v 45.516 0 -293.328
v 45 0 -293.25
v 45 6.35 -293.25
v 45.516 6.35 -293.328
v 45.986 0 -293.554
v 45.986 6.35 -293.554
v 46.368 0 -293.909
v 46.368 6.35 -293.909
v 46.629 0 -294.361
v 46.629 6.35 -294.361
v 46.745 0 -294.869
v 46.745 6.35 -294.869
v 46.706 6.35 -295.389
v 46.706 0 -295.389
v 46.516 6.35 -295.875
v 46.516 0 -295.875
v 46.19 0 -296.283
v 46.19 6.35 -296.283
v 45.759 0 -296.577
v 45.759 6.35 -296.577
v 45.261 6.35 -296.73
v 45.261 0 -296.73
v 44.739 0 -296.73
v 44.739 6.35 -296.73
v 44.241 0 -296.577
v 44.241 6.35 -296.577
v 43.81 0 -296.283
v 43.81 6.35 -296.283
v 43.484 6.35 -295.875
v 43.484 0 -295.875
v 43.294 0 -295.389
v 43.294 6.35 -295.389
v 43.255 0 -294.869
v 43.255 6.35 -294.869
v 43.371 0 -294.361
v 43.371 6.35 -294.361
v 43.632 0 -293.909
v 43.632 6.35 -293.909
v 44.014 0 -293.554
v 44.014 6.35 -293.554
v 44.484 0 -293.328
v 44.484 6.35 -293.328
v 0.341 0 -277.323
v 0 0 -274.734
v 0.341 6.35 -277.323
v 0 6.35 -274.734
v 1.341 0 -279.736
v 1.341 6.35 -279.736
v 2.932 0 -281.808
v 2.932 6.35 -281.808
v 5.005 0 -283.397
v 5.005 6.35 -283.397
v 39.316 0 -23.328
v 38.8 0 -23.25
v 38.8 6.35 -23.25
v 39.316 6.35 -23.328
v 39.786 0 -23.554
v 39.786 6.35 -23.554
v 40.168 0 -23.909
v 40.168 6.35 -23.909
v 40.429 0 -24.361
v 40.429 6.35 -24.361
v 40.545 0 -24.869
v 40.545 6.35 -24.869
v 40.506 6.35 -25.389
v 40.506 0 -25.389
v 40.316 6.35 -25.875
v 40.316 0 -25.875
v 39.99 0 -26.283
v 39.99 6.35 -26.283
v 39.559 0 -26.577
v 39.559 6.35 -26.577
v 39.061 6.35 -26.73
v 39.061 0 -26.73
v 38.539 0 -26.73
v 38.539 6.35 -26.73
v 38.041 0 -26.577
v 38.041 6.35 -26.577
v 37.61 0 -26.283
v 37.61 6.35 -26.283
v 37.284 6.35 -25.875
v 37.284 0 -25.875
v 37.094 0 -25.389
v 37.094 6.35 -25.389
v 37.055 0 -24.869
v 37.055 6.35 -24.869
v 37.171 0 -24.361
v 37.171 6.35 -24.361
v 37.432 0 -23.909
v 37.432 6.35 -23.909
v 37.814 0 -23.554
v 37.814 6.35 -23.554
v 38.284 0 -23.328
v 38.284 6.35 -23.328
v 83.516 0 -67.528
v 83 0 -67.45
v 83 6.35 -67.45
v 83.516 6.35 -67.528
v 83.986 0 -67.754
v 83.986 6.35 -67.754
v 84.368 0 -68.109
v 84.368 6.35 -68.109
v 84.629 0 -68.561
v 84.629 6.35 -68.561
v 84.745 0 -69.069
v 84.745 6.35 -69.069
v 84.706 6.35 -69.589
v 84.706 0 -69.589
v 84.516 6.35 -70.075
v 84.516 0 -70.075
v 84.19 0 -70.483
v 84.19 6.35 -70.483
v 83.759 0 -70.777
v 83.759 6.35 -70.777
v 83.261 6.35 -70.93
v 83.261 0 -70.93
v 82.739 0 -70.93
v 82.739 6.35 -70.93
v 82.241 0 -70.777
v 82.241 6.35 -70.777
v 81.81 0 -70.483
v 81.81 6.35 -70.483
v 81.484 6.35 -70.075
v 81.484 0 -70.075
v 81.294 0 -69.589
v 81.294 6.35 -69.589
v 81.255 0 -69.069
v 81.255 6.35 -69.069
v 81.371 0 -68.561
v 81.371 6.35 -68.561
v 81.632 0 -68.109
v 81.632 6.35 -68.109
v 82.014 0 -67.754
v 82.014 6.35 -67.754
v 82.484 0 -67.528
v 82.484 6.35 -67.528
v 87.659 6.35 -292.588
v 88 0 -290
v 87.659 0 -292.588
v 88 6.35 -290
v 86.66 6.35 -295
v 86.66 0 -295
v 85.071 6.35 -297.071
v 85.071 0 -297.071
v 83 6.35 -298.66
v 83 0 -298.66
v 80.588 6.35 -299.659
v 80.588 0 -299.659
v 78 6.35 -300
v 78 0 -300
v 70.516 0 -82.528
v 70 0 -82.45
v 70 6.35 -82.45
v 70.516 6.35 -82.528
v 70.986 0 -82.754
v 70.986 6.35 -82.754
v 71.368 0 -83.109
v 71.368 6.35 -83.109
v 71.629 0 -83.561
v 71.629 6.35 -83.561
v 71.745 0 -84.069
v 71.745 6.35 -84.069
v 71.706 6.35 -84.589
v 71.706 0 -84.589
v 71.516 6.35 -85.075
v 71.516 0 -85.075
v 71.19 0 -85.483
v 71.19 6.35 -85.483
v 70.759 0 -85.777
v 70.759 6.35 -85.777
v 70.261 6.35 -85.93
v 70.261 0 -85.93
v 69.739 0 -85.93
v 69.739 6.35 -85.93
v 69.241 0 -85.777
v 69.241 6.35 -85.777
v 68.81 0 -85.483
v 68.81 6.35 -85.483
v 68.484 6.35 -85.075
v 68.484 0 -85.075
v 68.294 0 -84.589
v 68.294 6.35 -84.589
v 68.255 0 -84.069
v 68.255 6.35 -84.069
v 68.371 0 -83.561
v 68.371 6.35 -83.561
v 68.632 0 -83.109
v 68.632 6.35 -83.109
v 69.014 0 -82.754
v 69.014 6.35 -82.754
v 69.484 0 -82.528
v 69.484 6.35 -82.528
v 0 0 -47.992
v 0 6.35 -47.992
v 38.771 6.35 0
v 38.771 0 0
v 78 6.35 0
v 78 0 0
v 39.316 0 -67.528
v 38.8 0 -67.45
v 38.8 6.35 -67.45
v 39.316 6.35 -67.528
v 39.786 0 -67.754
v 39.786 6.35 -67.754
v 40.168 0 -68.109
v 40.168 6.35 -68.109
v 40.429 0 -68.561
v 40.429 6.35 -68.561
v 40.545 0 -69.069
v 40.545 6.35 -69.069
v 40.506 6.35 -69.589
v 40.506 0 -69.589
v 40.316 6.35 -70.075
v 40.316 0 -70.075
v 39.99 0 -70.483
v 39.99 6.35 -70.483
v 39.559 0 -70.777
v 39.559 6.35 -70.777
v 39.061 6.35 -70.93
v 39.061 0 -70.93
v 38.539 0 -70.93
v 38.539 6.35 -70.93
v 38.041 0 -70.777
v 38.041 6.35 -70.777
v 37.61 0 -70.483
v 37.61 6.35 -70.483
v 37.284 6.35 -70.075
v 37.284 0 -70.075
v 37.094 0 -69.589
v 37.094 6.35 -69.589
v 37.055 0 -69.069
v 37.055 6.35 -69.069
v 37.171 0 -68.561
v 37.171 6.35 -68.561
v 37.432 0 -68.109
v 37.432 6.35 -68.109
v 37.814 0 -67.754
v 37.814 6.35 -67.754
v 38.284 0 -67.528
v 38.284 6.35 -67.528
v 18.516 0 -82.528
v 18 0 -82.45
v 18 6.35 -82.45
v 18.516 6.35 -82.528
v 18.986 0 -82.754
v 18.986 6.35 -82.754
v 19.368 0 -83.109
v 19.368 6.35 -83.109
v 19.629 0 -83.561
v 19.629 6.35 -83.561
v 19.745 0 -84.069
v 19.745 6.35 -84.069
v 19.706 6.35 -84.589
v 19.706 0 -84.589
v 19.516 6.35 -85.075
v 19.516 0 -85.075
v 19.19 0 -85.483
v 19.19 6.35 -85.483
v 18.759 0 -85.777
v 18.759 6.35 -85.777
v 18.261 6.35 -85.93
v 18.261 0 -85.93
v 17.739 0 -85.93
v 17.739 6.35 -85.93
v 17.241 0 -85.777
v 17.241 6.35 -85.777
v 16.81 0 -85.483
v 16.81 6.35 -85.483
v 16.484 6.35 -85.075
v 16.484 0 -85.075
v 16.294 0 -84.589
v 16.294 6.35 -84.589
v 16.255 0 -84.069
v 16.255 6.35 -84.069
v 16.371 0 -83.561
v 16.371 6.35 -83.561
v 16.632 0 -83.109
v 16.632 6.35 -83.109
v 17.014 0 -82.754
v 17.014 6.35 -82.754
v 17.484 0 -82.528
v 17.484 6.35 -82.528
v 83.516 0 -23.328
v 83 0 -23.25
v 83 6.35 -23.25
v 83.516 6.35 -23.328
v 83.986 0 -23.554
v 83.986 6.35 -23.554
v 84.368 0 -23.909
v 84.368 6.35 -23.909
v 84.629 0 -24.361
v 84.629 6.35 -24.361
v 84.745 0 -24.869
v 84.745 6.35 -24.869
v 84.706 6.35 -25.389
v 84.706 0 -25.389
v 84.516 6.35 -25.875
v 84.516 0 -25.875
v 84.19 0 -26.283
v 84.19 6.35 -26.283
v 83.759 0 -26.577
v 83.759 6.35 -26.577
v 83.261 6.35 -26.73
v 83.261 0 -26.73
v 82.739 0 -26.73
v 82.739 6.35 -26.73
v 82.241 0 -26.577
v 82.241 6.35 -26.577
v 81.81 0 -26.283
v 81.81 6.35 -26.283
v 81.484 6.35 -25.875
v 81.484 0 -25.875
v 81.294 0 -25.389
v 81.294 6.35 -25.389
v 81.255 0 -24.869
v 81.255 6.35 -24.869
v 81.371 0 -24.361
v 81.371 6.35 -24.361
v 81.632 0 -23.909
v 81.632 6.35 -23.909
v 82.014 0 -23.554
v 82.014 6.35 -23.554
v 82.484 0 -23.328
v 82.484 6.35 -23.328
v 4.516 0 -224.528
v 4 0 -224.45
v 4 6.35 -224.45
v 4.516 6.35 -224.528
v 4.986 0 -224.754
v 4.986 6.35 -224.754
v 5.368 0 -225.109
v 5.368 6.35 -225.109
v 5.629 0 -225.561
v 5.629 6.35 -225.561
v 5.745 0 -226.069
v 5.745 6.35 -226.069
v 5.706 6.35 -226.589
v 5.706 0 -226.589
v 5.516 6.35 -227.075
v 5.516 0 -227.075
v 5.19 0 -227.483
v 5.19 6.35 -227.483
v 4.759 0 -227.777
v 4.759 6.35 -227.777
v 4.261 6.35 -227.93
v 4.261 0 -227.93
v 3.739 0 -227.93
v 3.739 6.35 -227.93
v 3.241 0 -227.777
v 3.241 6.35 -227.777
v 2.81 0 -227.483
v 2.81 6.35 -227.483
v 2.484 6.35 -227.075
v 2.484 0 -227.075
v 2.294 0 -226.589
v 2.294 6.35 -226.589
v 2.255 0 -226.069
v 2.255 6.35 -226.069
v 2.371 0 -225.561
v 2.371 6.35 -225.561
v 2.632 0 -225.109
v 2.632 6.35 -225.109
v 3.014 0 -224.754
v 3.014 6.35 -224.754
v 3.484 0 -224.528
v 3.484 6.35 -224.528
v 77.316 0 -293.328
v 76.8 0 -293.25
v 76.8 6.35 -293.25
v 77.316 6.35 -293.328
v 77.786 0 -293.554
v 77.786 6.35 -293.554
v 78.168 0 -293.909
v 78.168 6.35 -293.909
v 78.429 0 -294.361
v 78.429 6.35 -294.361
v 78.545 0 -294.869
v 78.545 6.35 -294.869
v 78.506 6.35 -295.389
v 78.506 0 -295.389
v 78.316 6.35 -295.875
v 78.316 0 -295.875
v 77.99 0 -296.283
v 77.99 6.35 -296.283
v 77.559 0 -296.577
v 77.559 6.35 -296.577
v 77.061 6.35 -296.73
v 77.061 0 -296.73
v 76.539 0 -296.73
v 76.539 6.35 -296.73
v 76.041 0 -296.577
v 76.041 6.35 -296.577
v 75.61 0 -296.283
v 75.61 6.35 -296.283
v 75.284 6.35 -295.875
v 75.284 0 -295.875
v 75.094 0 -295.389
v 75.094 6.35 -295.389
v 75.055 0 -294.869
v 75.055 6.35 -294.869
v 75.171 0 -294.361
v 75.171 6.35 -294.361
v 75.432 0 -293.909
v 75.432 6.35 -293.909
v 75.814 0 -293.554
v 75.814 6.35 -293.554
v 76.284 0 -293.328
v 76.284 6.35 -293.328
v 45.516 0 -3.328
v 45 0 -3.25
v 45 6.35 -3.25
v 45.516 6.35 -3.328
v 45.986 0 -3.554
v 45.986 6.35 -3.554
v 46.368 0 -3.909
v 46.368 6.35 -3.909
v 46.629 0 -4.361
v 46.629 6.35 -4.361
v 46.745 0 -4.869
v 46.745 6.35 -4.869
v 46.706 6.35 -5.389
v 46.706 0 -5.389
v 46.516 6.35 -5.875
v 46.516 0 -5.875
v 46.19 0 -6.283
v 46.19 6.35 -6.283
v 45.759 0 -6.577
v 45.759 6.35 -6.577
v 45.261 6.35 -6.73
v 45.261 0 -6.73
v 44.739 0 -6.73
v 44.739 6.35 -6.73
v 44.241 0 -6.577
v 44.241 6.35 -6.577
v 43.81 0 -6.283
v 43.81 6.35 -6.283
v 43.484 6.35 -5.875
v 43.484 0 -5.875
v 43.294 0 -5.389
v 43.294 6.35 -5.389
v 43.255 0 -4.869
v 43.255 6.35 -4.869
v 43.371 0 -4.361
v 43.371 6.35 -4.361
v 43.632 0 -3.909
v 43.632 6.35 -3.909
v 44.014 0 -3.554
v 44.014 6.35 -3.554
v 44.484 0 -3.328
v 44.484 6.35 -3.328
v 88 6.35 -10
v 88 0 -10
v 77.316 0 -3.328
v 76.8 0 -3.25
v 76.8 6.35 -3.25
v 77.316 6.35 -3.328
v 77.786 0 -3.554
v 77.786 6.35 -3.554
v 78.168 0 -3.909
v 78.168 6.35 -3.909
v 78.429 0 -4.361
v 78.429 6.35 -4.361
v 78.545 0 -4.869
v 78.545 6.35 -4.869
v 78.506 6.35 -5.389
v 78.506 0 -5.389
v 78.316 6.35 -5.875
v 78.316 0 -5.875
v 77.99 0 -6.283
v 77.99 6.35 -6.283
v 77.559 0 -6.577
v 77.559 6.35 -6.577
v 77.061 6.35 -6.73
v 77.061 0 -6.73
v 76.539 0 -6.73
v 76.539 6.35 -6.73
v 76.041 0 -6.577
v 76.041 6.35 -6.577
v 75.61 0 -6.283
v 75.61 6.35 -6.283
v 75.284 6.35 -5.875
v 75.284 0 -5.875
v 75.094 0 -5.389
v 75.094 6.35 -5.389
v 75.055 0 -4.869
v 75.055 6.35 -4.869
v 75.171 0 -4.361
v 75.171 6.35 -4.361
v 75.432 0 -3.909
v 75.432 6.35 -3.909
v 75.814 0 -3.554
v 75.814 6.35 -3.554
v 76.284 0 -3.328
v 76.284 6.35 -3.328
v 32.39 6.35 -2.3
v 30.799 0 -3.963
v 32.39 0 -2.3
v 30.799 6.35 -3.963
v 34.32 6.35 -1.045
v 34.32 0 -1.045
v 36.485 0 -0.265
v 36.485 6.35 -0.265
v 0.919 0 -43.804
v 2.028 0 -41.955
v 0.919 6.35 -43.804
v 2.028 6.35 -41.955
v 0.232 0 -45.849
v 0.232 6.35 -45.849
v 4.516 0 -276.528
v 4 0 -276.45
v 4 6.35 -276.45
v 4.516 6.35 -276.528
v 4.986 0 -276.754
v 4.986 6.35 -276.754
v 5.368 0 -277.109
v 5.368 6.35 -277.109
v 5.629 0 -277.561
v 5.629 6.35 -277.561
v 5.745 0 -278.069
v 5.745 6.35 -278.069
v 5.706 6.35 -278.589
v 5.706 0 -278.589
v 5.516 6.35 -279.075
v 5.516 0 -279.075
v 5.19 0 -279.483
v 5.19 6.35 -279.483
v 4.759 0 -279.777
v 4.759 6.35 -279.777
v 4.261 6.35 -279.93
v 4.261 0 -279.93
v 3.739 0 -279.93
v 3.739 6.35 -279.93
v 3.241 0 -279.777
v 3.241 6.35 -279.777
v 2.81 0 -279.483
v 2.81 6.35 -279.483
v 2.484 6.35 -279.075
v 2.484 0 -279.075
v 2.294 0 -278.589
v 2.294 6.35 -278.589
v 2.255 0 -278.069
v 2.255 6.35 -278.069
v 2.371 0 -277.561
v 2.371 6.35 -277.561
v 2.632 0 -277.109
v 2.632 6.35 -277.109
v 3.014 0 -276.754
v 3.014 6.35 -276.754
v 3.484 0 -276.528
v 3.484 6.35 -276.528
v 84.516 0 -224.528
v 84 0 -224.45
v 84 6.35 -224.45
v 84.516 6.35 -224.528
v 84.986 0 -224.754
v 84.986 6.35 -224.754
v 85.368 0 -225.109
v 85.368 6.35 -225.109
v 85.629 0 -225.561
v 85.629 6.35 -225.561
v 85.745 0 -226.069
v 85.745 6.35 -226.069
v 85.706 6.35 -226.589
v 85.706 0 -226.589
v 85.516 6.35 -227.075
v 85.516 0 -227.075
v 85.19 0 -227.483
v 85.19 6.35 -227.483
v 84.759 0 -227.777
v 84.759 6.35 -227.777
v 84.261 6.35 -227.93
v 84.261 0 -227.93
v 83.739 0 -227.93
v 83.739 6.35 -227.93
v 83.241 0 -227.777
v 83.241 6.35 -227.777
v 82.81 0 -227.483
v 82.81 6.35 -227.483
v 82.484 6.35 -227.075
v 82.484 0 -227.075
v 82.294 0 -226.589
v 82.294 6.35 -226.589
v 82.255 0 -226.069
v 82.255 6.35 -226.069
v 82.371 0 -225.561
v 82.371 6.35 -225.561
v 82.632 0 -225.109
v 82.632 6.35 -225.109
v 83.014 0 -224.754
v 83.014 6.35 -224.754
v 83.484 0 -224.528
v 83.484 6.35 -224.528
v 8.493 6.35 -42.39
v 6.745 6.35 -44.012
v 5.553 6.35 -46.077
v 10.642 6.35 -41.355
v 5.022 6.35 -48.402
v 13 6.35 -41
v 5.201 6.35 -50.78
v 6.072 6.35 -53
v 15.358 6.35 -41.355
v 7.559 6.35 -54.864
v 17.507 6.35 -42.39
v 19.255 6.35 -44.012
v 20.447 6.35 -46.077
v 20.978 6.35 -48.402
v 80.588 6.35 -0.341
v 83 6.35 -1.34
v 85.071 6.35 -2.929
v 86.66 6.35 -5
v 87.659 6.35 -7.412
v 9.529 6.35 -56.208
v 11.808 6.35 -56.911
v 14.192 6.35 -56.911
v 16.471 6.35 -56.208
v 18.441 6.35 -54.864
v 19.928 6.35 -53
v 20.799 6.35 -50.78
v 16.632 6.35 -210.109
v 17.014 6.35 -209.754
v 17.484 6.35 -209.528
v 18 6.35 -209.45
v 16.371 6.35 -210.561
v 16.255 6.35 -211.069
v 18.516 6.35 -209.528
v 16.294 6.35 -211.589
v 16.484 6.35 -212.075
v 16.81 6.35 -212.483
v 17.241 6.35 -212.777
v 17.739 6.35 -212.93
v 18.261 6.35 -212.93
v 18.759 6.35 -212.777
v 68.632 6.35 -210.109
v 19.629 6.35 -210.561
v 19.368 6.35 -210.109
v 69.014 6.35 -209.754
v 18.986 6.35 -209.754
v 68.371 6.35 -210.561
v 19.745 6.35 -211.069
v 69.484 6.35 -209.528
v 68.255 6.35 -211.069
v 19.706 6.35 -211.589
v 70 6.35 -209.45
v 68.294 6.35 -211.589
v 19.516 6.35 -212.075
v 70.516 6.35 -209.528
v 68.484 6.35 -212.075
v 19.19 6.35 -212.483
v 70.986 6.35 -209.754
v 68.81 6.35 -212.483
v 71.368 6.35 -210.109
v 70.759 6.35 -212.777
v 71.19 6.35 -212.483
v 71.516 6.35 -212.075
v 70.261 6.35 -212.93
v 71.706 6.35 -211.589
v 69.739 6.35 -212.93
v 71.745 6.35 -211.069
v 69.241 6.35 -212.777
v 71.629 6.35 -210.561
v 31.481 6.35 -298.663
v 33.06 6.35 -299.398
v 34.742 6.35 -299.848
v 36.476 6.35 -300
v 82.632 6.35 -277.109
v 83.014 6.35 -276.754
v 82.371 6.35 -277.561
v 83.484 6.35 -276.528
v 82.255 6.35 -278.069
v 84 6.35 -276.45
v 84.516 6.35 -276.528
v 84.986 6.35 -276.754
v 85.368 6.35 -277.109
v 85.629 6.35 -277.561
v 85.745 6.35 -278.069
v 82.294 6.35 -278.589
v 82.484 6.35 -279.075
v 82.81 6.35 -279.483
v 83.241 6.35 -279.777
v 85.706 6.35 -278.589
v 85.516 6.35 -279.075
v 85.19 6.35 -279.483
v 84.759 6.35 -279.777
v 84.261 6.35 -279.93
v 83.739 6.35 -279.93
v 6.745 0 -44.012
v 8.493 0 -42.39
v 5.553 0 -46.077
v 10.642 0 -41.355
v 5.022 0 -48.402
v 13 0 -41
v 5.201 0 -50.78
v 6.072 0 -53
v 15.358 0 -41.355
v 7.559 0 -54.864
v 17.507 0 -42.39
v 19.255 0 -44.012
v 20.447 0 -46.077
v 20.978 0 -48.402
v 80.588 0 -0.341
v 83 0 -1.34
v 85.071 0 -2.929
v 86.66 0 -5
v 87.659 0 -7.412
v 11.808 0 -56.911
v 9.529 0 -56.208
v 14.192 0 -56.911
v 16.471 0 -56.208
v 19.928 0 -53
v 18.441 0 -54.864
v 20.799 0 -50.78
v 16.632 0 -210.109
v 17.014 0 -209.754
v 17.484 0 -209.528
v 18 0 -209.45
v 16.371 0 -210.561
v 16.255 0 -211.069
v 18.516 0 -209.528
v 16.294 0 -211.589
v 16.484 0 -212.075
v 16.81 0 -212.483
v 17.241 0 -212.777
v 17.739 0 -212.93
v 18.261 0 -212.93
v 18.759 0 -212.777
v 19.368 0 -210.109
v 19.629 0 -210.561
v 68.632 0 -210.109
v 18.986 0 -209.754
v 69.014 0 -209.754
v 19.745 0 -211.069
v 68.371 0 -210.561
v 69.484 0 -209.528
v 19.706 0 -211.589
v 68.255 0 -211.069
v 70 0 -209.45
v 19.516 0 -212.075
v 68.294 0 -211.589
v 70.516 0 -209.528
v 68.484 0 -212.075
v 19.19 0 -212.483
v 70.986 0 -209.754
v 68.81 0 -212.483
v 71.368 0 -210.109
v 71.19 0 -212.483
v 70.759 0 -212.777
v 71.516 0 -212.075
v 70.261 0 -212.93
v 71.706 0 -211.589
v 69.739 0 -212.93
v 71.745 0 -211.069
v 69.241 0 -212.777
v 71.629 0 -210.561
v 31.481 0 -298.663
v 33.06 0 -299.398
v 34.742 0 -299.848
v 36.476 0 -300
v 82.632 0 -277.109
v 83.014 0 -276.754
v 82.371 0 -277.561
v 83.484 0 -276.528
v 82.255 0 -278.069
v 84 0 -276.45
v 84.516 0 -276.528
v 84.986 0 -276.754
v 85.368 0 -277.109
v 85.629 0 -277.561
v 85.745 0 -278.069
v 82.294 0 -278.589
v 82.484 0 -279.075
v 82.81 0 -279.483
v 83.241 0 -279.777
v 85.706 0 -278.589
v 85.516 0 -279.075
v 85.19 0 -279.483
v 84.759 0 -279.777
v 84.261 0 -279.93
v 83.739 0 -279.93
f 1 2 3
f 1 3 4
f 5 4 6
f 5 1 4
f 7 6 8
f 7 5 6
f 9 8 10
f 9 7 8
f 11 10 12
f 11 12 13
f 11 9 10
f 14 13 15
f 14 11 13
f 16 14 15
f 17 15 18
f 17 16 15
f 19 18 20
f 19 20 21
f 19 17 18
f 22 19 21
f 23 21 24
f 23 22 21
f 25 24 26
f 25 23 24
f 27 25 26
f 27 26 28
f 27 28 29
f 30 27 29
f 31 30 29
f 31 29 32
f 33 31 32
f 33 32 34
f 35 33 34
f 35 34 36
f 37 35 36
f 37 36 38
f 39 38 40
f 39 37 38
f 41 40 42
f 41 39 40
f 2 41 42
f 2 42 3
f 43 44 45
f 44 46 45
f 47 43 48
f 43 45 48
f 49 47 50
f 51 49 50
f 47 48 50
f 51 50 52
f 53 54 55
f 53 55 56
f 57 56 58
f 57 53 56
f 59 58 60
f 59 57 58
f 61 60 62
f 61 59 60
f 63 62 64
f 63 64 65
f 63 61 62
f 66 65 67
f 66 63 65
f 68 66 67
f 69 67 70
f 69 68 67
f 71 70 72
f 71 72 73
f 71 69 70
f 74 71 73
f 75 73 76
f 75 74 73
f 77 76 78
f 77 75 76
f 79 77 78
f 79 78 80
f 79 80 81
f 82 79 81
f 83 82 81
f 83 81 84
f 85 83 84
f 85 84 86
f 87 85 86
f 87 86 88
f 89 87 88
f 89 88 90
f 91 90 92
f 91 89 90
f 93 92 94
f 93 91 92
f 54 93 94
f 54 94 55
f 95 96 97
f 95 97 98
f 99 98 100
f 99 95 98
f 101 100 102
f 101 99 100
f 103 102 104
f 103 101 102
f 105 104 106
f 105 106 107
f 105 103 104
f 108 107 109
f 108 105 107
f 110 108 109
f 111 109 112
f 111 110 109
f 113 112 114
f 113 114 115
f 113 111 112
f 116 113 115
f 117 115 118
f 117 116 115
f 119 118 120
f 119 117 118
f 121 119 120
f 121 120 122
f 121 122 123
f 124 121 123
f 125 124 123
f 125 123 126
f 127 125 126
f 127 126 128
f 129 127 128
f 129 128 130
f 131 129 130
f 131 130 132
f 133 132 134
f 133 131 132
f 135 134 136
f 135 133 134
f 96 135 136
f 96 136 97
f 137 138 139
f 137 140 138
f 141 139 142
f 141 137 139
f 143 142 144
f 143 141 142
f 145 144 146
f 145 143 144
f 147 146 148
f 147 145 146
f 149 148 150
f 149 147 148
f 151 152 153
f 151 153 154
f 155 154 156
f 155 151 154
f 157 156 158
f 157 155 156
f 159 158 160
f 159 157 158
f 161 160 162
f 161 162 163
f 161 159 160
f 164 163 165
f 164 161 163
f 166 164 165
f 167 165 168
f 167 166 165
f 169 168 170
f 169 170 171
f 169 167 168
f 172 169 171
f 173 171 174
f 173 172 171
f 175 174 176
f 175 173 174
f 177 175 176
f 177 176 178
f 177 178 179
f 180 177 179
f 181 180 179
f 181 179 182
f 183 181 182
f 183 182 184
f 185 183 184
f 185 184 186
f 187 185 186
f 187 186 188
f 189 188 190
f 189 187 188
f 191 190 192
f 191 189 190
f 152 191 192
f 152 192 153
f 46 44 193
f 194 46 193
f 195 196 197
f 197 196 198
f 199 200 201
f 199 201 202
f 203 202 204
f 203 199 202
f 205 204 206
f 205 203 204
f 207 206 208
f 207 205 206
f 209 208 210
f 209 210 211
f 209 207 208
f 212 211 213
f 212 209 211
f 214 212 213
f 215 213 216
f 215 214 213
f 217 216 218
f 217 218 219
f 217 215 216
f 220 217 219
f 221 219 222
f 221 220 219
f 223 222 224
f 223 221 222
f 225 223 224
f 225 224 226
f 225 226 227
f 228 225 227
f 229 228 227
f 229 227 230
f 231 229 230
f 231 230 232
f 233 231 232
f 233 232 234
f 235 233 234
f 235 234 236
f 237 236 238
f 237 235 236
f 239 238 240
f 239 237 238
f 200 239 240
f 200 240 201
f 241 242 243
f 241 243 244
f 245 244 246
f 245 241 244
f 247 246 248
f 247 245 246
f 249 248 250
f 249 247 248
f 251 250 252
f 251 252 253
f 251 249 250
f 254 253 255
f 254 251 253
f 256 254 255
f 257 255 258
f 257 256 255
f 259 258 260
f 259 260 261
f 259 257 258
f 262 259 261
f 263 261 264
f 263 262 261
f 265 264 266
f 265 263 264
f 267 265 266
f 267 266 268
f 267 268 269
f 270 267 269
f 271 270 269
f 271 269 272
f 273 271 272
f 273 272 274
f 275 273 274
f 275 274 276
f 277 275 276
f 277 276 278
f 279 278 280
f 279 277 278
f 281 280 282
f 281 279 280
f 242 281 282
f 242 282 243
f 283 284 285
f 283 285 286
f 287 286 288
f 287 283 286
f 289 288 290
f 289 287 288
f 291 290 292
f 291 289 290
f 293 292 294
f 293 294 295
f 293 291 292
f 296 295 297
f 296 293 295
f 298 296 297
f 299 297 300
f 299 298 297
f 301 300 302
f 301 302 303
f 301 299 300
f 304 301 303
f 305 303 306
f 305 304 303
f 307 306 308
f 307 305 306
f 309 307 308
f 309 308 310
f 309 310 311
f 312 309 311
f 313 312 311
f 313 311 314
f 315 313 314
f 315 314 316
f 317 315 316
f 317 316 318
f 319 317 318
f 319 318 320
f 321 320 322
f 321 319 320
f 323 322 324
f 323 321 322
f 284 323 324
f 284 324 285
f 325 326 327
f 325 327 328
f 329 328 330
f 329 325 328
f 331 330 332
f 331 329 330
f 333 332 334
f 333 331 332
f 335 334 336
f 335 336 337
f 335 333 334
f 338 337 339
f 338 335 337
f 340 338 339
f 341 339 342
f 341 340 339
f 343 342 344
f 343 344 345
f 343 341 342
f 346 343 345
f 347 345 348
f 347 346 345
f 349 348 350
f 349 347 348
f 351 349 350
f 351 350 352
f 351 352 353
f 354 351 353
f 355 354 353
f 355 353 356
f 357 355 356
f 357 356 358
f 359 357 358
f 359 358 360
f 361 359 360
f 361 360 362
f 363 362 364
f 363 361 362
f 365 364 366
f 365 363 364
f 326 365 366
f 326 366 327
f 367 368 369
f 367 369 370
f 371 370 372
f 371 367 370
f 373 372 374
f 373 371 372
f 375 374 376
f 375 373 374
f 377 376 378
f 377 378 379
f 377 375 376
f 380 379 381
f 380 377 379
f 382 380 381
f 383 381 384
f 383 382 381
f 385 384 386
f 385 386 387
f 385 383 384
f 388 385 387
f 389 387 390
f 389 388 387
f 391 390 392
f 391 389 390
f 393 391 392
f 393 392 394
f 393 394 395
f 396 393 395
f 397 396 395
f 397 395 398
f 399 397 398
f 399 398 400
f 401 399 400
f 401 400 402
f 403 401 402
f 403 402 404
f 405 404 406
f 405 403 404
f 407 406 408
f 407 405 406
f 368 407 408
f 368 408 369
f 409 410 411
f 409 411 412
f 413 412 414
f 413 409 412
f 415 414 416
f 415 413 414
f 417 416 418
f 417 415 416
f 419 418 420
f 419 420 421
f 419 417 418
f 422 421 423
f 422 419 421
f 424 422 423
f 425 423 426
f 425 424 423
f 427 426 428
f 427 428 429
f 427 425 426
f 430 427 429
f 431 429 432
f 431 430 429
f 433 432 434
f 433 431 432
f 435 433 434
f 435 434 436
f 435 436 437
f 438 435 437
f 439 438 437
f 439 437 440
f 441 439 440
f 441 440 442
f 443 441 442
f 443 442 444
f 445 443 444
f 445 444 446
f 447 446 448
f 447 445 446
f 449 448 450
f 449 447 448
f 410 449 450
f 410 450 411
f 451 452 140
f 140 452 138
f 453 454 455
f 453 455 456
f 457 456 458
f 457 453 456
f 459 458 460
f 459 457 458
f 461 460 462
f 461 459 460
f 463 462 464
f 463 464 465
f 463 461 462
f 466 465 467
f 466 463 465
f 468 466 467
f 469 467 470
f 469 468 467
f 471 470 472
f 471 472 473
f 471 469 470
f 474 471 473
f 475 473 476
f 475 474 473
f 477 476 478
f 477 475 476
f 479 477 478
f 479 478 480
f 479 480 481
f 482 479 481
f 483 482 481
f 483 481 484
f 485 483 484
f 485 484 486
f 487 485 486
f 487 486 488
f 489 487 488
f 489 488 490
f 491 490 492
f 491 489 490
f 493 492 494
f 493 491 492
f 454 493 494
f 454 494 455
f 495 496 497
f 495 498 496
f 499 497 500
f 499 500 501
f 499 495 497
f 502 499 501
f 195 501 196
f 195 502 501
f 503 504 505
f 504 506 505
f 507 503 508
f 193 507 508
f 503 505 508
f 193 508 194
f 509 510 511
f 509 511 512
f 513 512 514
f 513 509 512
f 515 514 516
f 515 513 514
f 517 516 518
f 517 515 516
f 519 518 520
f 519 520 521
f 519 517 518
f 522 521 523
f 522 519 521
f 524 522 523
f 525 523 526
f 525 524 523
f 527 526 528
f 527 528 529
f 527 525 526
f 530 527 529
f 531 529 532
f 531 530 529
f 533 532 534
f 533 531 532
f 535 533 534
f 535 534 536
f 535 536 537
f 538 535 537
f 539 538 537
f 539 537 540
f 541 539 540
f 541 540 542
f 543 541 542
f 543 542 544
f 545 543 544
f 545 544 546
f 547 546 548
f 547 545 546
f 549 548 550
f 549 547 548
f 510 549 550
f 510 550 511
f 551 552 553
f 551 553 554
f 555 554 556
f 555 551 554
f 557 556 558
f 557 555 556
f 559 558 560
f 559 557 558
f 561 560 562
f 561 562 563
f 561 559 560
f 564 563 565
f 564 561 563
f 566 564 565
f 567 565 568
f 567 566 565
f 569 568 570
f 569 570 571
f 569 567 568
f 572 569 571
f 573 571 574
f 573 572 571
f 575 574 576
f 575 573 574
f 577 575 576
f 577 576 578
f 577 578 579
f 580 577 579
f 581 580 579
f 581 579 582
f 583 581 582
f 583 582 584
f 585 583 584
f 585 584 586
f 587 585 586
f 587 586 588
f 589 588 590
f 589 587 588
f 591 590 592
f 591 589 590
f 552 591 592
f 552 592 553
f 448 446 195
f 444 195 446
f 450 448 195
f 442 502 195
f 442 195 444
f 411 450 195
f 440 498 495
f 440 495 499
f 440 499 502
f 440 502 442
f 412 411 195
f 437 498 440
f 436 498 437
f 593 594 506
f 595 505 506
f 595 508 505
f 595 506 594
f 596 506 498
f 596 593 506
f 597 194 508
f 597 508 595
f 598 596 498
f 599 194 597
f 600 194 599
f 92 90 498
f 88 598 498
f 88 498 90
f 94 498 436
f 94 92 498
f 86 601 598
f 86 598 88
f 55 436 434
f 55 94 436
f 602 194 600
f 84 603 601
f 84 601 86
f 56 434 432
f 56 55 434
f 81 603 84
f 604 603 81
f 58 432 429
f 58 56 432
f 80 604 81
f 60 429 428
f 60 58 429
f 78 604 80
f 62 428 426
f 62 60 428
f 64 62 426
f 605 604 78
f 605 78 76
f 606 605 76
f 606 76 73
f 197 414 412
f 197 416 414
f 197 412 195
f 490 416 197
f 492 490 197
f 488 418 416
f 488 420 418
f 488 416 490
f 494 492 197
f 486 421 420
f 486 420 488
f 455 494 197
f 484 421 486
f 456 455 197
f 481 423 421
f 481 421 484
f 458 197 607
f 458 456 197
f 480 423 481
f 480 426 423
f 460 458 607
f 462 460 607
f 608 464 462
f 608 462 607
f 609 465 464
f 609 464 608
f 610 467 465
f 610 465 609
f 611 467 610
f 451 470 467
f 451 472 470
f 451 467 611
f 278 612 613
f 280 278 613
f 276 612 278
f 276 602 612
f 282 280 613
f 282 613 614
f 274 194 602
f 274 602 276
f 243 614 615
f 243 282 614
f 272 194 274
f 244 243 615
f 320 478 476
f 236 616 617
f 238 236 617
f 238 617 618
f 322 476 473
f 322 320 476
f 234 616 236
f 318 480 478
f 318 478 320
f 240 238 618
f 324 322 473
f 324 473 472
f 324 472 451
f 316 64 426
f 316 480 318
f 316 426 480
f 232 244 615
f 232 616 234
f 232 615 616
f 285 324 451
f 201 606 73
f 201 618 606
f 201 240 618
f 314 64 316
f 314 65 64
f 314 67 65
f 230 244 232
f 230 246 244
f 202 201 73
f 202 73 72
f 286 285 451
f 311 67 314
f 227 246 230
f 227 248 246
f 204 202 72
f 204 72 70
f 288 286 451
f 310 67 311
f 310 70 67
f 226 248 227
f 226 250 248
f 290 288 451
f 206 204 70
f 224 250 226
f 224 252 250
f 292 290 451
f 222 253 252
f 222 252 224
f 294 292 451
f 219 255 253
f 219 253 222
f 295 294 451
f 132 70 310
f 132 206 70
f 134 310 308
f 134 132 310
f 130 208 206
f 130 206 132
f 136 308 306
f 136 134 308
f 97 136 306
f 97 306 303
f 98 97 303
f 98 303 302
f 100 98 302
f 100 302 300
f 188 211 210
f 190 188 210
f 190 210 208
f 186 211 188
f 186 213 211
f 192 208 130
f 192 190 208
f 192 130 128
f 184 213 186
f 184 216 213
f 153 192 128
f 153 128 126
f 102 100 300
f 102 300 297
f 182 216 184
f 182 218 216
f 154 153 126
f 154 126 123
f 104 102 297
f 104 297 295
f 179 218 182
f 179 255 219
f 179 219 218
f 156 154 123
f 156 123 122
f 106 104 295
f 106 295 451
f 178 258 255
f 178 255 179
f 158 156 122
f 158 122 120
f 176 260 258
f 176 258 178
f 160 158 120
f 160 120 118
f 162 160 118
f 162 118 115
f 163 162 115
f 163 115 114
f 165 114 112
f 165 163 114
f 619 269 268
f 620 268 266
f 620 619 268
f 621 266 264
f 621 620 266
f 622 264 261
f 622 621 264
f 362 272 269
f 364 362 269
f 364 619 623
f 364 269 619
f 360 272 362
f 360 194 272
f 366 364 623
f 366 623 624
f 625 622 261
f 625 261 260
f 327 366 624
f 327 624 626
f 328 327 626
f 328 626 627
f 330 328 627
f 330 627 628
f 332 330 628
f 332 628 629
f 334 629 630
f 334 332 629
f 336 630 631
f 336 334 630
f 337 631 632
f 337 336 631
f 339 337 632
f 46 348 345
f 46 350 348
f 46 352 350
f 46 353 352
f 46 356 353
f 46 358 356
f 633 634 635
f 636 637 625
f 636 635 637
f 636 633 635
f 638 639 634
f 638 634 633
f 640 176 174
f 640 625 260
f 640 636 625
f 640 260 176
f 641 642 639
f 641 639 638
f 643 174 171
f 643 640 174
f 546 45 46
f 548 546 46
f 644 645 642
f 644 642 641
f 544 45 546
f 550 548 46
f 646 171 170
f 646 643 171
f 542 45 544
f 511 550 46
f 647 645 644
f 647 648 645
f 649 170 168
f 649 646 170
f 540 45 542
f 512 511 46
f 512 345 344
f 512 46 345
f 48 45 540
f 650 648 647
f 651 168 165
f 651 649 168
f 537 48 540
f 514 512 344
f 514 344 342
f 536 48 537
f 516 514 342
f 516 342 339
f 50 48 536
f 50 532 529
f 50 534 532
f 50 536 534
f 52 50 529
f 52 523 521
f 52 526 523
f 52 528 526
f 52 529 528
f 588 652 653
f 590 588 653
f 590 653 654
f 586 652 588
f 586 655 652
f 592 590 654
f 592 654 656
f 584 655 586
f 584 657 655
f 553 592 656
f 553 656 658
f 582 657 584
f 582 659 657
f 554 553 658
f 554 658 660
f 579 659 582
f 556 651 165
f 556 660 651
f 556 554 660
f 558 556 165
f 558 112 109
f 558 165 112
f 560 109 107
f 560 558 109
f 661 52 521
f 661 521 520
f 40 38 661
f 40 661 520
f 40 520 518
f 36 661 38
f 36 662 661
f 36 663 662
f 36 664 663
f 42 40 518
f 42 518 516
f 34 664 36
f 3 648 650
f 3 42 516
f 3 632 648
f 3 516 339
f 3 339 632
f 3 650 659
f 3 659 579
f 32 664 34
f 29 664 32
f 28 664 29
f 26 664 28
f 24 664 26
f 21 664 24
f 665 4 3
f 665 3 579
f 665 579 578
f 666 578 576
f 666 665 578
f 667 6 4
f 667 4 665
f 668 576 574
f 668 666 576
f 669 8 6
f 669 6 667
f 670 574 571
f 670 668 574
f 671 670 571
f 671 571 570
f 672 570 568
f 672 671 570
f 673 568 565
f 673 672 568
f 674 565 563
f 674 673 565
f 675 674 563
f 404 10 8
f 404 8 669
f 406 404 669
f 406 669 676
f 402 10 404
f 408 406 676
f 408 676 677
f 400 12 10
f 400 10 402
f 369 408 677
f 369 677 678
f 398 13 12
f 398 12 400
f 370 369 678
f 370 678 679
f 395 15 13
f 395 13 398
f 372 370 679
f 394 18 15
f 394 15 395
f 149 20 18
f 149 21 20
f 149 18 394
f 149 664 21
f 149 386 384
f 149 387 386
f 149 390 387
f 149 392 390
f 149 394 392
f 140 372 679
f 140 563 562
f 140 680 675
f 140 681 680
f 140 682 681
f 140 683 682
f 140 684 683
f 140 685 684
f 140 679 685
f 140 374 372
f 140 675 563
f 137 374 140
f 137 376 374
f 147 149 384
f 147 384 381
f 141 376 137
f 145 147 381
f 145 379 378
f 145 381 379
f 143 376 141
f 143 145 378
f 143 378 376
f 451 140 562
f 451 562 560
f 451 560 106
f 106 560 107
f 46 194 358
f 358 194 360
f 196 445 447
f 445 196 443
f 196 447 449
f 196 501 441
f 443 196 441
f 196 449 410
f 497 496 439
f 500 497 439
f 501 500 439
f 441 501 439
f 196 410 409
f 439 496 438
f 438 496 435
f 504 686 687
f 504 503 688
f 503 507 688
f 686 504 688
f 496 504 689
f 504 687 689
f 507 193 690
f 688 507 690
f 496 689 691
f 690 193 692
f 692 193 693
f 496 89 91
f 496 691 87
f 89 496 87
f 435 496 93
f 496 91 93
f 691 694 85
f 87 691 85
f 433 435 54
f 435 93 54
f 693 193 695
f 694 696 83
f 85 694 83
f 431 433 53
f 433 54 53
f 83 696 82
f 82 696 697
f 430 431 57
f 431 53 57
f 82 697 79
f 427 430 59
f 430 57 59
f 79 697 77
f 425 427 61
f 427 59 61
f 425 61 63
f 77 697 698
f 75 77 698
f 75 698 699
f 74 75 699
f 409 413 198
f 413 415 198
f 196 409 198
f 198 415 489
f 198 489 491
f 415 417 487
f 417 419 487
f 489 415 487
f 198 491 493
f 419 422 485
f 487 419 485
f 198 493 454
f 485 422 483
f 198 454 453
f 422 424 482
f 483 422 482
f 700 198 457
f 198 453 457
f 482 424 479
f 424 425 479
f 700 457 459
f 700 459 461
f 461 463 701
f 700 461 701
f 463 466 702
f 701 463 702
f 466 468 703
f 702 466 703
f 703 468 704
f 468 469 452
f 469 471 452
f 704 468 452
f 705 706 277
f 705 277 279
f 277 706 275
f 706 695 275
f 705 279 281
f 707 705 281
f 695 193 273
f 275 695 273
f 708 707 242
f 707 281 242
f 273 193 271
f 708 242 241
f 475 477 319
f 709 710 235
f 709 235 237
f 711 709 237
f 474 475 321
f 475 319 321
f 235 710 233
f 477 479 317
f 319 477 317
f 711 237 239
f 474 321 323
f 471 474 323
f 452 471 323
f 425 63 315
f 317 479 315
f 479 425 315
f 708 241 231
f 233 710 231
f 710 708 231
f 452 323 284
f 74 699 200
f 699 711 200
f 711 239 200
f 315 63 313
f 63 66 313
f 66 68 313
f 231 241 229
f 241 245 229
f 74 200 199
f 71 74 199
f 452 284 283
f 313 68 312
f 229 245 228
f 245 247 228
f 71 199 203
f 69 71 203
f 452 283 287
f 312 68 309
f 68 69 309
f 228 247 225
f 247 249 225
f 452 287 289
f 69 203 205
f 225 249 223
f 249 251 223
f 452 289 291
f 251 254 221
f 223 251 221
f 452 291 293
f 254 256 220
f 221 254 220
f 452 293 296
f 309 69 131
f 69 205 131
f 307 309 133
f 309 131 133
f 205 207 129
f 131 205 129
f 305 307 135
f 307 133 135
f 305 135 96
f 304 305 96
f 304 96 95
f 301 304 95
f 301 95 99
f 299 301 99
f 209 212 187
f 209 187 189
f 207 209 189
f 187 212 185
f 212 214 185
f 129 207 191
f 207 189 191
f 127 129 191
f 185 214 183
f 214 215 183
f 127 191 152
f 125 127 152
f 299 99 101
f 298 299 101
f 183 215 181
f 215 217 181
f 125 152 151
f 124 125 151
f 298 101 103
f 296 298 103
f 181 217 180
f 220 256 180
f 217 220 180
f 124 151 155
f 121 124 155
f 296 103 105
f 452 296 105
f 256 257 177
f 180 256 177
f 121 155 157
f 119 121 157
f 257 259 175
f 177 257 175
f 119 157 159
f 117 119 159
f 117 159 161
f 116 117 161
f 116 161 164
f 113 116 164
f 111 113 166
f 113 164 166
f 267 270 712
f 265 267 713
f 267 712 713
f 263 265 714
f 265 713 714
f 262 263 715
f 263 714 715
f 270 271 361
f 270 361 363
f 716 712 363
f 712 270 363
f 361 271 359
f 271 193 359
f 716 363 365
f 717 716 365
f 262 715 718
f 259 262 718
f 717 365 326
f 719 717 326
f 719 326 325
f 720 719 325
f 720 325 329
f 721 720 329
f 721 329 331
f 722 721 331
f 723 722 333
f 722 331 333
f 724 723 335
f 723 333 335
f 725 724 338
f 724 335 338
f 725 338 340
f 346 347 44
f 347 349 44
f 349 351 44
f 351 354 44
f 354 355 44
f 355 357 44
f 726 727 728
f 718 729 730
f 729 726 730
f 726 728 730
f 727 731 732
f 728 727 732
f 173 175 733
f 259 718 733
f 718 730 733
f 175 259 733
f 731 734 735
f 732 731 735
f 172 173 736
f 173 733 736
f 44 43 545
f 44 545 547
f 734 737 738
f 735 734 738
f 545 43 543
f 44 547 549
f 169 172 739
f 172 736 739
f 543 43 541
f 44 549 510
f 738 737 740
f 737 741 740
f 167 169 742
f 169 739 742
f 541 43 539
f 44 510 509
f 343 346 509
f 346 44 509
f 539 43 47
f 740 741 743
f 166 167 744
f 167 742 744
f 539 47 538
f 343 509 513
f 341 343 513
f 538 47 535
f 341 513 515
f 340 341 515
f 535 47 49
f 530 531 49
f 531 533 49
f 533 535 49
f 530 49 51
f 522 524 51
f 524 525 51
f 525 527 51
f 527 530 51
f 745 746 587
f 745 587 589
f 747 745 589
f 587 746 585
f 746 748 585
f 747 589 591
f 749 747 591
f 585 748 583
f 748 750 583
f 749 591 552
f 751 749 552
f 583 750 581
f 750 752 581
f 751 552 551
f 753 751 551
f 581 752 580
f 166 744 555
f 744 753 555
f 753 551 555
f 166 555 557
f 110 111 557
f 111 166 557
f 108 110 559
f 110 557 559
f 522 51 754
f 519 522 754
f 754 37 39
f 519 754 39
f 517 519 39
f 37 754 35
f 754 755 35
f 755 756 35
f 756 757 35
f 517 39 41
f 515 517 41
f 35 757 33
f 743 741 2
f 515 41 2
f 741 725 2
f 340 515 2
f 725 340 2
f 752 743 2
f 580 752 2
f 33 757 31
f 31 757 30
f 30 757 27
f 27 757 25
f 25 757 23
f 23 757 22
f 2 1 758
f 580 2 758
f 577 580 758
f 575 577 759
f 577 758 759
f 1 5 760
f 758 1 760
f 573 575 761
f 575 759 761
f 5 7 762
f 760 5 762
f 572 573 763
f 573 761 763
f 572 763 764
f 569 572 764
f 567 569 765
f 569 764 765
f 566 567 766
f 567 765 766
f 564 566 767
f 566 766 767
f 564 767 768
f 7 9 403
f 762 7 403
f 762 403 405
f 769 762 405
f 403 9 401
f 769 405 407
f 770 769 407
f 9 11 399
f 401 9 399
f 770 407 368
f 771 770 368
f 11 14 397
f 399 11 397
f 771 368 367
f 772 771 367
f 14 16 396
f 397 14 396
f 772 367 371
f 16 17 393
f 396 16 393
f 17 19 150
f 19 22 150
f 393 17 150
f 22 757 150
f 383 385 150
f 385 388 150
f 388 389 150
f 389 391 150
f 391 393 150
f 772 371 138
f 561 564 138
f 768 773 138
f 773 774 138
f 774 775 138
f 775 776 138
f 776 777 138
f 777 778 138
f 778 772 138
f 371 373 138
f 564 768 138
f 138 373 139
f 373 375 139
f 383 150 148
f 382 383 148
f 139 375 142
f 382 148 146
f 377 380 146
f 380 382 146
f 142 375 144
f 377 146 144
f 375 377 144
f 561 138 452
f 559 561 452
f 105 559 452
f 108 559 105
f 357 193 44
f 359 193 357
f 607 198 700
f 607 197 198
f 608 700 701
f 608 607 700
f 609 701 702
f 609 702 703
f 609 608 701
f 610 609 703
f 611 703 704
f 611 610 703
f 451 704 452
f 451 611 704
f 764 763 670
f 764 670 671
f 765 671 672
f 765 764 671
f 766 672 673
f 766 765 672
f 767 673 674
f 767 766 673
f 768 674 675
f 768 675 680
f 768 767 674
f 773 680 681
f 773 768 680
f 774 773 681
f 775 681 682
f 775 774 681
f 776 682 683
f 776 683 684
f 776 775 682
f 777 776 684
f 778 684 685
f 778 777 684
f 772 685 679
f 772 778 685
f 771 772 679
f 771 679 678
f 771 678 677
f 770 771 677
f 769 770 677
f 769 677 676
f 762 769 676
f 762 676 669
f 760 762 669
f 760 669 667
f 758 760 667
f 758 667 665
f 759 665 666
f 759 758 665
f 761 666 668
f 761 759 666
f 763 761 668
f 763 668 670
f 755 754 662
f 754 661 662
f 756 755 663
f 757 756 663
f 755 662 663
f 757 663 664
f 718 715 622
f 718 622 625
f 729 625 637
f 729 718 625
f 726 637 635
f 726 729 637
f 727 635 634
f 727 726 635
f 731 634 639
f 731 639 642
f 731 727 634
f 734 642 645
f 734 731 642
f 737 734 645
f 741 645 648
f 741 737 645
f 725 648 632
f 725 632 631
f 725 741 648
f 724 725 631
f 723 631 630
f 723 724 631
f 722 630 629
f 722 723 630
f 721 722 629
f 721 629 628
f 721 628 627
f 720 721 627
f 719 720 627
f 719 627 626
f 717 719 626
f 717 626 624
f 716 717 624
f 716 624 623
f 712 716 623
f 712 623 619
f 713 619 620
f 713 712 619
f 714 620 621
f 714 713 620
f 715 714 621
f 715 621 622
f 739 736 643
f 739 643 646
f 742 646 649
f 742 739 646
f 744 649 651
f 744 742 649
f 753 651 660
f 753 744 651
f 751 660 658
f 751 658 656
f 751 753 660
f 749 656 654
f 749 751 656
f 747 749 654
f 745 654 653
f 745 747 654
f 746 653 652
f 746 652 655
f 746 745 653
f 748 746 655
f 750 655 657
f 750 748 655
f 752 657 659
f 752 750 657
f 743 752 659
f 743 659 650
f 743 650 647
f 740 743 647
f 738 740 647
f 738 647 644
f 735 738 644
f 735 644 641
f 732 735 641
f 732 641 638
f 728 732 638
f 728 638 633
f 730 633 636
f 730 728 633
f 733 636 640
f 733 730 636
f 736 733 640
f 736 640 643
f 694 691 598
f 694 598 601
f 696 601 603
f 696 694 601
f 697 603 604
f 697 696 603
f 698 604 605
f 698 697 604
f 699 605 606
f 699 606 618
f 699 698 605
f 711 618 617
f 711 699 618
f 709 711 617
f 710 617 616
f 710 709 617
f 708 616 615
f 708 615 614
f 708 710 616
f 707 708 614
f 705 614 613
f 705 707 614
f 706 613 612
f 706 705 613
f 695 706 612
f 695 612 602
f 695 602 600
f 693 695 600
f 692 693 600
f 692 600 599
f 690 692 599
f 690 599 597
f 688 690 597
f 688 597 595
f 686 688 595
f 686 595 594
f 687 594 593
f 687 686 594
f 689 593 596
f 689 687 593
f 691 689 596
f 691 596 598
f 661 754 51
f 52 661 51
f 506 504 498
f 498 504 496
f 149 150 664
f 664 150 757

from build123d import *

# Parameters (mm, degrees)
SKETCH1_R           = 8
SKETCH1_R_2         = 1.75
BOSS_EXTRUDE1_DEPTH = 6.35
FILLET1_R           = 10


with BuildPart() as part:
    # Sketch1 → Boss-Extrude1 (new body)
    with BuildSketch(Plane(origin=(0, 0, 0), x_dir=(1, 0, 0), z_dir=(0, 1, 0))):
        Polygon((0, 44.633081493), (33.8, 0), (88, 0), (88, 300), (33.8, 300), (0, 280.510901235), align=None)
        with Locations(Location((13, 49, 0), (0, 0, 270))):
            Circle(SKETCH1_R, mode=Mode.SUBTRACT)
        with Locations(Location((38.8, 25, 0), (0, 0, 270))):
            Circle(SKETCH1_R_2, mode=Mode.SUBTRACT)
        with Locations(Location((38.8, 69.2, 0), (0, 0, 270))):
            Circle(SKETCH1_R_2, mode=Mode.SUBTRACT)
        with Locations(Location((18, 84.2, 0), (0, 0, 270))):
            Circle(SKETCH1_R_2, mode=Mode.SUBTRACT)
        with Locations(Location((45, 5, 0), (0, 0, 270))):
            Circle(SKETCH1_R_2, mode=Mode.SUBTRACT)
        with Locations(Location((76.8, 5, 0), (0, 0, 270))):
            Circle(SKETCH1_R_2, mode=Mode.SUBTRACT)
        with Locations(Location((83, 25, 0), (0, 0, 270))):
            Circle(SKETCH1_R_2, mode=Mode.SUBTRACT)
        with Locations(Location((83, 69.2, 0), (0, 0, 270))):
            Circle(SKETCH1_R_2, mode=Mode.SUBTRACT)
        with Locations(Location((70, 84.2, 0), (0, 0, 270))):
            Circle(SKETCH1_R_2, mode=Mode.SUBTRACT)
        with Locations(Location((18, 211.2, 0), (0, 0, 270))):
            Circle(SKETCH1_R_2, mode=Mode.SUBTRACT)
        with Locations(Location((4, 226.2, 0), (0, 0, 270))):
            Circle(SKETCH1_R_2, mode=Mode.SUBTRACT)
        with Locations(Location((4, 278.2, 0), (0, 0, 270))):
            Circle(SKETCH1_R_2, mode=Mode.SUBTRACT)
        with Locations(Location((70, 211.2, 0), (0, 0, 270))):
            Circle(SKETCH1_R_2, mode=Mode.SUBTRACT)
        with Locations(Location((45, 295, 0), (0, 0, 270))):
            Circle(SKETCH1_R_2, mode=Mode.SUBTRACT)
        with Locations(Location((84, 226.2, 0), (0, 0, 270))):
            Circle(SKETCH1_R_2, mode=Mode.SUBTRACT)
        with Locations(Location((76.8, 295, 0), (0, 0, 270))):
            Circle(SKETCH1_R_2, mode=Mode.SUBTRACT)
        with Locations(Location((84, 278.2, 0), (0, 0, 270))):
            Circle(SKETCH1_R_2, mode=Mode.SUBTRACT)
    extrude(amount=BOSS_EXTRUDE1_DEPTH)

    # Fillet1
    fillet1_edges = [part.edges().sort_by_distance(p)[0] for p in [
        (88, 3.175, -300),
        (88, 3.175, 0),
        (33.8, 3.175, 0),
        (0, 3.175, -44.633081493),
        (0, 3.175, -280.510901235),
        (33.8, 3.175, -300),
    ]]
    fillet(fillet1_edges, radius=FILLET1_R)


solid = part.part
